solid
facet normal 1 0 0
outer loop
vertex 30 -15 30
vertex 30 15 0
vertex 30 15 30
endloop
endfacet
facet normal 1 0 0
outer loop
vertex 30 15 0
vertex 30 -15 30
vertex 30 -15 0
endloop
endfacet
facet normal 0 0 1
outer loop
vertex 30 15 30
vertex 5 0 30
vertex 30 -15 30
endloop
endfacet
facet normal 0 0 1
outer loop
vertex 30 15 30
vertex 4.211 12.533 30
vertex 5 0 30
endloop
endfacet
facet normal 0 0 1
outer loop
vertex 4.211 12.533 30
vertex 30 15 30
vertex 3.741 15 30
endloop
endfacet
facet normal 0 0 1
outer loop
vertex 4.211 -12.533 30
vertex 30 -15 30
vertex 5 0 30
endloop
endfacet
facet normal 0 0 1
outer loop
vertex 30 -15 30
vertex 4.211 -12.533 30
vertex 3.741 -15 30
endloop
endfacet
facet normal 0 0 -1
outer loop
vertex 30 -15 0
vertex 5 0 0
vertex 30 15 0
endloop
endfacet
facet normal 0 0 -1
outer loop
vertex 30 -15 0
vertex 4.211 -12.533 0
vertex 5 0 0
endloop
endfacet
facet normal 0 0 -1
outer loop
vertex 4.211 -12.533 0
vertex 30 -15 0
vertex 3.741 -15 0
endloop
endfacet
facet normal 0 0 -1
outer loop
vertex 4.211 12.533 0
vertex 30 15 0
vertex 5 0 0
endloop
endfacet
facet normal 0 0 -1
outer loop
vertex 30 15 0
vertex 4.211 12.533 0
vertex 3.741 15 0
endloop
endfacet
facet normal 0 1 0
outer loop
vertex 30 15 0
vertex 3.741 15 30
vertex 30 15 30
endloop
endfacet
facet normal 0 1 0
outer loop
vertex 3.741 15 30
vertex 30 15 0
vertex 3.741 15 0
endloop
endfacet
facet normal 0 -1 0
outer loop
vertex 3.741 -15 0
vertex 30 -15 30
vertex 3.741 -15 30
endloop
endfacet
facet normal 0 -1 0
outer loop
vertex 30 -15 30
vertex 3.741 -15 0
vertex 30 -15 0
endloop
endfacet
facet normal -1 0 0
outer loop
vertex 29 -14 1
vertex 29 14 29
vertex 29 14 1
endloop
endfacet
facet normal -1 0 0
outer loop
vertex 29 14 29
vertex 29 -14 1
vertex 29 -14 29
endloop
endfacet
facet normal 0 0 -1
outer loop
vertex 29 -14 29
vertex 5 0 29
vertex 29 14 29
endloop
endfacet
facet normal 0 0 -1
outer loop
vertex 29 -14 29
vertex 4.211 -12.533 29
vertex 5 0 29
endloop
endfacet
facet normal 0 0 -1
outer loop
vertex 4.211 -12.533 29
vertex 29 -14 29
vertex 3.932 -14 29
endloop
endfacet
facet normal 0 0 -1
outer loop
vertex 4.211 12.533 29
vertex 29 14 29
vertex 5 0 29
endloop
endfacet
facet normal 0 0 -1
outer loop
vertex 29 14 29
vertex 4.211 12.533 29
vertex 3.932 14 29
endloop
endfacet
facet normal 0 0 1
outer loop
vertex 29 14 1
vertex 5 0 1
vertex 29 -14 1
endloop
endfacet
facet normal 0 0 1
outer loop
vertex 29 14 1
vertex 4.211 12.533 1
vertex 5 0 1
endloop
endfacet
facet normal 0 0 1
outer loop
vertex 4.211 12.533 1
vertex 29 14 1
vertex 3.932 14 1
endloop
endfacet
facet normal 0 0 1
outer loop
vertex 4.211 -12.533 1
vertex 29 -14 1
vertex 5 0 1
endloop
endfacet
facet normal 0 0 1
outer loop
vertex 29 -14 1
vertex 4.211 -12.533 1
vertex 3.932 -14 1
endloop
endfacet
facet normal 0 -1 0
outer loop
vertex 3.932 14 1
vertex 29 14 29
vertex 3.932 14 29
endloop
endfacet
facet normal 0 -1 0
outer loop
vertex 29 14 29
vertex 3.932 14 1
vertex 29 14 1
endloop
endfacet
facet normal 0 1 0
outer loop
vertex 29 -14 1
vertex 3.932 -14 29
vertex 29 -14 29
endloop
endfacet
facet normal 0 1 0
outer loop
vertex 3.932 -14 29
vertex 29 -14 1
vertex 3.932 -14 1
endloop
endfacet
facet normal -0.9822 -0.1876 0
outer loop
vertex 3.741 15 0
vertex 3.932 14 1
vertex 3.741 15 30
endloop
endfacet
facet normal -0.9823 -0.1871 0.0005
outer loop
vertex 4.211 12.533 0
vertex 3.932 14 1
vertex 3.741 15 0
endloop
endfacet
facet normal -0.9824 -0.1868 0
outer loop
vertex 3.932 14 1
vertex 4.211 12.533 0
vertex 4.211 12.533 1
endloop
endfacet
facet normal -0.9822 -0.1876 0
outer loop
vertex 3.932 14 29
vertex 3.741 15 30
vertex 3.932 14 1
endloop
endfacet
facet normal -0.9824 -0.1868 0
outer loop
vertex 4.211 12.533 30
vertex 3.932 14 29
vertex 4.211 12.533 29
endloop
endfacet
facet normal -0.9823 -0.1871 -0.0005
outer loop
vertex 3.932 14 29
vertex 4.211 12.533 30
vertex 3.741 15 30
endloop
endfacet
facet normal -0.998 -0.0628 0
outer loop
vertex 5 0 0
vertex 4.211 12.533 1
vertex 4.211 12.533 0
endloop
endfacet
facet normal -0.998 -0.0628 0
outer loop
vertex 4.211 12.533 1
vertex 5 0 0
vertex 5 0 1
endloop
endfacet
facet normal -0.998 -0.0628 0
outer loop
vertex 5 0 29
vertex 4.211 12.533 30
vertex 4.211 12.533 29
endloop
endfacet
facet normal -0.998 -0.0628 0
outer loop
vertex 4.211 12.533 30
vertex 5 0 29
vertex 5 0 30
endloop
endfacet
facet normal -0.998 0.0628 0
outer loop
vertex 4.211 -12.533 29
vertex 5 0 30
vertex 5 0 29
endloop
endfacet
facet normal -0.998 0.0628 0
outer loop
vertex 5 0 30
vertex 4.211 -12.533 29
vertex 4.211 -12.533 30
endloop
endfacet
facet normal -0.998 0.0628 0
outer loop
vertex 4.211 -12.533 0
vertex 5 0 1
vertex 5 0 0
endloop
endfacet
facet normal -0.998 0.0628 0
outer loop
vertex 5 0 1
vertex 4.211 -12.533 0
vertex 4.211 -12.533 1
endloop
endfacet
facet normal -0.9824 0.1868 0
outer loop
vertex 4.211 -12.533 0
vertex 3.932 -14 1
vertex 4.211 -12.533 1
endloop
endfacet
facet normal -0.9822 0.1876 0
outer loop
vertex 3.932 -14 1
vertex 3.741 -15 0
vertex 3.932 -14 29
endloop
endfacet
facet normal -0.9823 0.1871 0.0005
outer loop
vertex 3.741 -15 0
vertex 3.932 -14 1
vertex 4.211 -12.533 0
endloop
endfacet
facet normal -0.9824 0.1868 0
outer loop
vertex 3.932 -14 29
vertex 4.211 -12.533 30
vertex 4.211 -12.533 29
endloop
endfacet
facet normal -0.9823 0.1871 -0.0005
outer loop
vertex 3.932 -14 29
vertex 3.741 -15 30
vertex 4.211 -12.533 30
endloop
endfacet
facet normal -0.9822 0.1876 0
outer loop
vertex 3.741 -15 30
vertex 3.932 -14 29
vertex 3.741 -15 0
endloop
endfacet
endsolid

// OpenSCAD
$fn=50;

difference() {
  translate([0,-15,0])
  box();
  translate([-95,0,0])
  cylinder(d=200,h=30);
}

module box() {
  difference() {
    cube(30);
    translate([1,1,1])
    cube(28);
  }
}
